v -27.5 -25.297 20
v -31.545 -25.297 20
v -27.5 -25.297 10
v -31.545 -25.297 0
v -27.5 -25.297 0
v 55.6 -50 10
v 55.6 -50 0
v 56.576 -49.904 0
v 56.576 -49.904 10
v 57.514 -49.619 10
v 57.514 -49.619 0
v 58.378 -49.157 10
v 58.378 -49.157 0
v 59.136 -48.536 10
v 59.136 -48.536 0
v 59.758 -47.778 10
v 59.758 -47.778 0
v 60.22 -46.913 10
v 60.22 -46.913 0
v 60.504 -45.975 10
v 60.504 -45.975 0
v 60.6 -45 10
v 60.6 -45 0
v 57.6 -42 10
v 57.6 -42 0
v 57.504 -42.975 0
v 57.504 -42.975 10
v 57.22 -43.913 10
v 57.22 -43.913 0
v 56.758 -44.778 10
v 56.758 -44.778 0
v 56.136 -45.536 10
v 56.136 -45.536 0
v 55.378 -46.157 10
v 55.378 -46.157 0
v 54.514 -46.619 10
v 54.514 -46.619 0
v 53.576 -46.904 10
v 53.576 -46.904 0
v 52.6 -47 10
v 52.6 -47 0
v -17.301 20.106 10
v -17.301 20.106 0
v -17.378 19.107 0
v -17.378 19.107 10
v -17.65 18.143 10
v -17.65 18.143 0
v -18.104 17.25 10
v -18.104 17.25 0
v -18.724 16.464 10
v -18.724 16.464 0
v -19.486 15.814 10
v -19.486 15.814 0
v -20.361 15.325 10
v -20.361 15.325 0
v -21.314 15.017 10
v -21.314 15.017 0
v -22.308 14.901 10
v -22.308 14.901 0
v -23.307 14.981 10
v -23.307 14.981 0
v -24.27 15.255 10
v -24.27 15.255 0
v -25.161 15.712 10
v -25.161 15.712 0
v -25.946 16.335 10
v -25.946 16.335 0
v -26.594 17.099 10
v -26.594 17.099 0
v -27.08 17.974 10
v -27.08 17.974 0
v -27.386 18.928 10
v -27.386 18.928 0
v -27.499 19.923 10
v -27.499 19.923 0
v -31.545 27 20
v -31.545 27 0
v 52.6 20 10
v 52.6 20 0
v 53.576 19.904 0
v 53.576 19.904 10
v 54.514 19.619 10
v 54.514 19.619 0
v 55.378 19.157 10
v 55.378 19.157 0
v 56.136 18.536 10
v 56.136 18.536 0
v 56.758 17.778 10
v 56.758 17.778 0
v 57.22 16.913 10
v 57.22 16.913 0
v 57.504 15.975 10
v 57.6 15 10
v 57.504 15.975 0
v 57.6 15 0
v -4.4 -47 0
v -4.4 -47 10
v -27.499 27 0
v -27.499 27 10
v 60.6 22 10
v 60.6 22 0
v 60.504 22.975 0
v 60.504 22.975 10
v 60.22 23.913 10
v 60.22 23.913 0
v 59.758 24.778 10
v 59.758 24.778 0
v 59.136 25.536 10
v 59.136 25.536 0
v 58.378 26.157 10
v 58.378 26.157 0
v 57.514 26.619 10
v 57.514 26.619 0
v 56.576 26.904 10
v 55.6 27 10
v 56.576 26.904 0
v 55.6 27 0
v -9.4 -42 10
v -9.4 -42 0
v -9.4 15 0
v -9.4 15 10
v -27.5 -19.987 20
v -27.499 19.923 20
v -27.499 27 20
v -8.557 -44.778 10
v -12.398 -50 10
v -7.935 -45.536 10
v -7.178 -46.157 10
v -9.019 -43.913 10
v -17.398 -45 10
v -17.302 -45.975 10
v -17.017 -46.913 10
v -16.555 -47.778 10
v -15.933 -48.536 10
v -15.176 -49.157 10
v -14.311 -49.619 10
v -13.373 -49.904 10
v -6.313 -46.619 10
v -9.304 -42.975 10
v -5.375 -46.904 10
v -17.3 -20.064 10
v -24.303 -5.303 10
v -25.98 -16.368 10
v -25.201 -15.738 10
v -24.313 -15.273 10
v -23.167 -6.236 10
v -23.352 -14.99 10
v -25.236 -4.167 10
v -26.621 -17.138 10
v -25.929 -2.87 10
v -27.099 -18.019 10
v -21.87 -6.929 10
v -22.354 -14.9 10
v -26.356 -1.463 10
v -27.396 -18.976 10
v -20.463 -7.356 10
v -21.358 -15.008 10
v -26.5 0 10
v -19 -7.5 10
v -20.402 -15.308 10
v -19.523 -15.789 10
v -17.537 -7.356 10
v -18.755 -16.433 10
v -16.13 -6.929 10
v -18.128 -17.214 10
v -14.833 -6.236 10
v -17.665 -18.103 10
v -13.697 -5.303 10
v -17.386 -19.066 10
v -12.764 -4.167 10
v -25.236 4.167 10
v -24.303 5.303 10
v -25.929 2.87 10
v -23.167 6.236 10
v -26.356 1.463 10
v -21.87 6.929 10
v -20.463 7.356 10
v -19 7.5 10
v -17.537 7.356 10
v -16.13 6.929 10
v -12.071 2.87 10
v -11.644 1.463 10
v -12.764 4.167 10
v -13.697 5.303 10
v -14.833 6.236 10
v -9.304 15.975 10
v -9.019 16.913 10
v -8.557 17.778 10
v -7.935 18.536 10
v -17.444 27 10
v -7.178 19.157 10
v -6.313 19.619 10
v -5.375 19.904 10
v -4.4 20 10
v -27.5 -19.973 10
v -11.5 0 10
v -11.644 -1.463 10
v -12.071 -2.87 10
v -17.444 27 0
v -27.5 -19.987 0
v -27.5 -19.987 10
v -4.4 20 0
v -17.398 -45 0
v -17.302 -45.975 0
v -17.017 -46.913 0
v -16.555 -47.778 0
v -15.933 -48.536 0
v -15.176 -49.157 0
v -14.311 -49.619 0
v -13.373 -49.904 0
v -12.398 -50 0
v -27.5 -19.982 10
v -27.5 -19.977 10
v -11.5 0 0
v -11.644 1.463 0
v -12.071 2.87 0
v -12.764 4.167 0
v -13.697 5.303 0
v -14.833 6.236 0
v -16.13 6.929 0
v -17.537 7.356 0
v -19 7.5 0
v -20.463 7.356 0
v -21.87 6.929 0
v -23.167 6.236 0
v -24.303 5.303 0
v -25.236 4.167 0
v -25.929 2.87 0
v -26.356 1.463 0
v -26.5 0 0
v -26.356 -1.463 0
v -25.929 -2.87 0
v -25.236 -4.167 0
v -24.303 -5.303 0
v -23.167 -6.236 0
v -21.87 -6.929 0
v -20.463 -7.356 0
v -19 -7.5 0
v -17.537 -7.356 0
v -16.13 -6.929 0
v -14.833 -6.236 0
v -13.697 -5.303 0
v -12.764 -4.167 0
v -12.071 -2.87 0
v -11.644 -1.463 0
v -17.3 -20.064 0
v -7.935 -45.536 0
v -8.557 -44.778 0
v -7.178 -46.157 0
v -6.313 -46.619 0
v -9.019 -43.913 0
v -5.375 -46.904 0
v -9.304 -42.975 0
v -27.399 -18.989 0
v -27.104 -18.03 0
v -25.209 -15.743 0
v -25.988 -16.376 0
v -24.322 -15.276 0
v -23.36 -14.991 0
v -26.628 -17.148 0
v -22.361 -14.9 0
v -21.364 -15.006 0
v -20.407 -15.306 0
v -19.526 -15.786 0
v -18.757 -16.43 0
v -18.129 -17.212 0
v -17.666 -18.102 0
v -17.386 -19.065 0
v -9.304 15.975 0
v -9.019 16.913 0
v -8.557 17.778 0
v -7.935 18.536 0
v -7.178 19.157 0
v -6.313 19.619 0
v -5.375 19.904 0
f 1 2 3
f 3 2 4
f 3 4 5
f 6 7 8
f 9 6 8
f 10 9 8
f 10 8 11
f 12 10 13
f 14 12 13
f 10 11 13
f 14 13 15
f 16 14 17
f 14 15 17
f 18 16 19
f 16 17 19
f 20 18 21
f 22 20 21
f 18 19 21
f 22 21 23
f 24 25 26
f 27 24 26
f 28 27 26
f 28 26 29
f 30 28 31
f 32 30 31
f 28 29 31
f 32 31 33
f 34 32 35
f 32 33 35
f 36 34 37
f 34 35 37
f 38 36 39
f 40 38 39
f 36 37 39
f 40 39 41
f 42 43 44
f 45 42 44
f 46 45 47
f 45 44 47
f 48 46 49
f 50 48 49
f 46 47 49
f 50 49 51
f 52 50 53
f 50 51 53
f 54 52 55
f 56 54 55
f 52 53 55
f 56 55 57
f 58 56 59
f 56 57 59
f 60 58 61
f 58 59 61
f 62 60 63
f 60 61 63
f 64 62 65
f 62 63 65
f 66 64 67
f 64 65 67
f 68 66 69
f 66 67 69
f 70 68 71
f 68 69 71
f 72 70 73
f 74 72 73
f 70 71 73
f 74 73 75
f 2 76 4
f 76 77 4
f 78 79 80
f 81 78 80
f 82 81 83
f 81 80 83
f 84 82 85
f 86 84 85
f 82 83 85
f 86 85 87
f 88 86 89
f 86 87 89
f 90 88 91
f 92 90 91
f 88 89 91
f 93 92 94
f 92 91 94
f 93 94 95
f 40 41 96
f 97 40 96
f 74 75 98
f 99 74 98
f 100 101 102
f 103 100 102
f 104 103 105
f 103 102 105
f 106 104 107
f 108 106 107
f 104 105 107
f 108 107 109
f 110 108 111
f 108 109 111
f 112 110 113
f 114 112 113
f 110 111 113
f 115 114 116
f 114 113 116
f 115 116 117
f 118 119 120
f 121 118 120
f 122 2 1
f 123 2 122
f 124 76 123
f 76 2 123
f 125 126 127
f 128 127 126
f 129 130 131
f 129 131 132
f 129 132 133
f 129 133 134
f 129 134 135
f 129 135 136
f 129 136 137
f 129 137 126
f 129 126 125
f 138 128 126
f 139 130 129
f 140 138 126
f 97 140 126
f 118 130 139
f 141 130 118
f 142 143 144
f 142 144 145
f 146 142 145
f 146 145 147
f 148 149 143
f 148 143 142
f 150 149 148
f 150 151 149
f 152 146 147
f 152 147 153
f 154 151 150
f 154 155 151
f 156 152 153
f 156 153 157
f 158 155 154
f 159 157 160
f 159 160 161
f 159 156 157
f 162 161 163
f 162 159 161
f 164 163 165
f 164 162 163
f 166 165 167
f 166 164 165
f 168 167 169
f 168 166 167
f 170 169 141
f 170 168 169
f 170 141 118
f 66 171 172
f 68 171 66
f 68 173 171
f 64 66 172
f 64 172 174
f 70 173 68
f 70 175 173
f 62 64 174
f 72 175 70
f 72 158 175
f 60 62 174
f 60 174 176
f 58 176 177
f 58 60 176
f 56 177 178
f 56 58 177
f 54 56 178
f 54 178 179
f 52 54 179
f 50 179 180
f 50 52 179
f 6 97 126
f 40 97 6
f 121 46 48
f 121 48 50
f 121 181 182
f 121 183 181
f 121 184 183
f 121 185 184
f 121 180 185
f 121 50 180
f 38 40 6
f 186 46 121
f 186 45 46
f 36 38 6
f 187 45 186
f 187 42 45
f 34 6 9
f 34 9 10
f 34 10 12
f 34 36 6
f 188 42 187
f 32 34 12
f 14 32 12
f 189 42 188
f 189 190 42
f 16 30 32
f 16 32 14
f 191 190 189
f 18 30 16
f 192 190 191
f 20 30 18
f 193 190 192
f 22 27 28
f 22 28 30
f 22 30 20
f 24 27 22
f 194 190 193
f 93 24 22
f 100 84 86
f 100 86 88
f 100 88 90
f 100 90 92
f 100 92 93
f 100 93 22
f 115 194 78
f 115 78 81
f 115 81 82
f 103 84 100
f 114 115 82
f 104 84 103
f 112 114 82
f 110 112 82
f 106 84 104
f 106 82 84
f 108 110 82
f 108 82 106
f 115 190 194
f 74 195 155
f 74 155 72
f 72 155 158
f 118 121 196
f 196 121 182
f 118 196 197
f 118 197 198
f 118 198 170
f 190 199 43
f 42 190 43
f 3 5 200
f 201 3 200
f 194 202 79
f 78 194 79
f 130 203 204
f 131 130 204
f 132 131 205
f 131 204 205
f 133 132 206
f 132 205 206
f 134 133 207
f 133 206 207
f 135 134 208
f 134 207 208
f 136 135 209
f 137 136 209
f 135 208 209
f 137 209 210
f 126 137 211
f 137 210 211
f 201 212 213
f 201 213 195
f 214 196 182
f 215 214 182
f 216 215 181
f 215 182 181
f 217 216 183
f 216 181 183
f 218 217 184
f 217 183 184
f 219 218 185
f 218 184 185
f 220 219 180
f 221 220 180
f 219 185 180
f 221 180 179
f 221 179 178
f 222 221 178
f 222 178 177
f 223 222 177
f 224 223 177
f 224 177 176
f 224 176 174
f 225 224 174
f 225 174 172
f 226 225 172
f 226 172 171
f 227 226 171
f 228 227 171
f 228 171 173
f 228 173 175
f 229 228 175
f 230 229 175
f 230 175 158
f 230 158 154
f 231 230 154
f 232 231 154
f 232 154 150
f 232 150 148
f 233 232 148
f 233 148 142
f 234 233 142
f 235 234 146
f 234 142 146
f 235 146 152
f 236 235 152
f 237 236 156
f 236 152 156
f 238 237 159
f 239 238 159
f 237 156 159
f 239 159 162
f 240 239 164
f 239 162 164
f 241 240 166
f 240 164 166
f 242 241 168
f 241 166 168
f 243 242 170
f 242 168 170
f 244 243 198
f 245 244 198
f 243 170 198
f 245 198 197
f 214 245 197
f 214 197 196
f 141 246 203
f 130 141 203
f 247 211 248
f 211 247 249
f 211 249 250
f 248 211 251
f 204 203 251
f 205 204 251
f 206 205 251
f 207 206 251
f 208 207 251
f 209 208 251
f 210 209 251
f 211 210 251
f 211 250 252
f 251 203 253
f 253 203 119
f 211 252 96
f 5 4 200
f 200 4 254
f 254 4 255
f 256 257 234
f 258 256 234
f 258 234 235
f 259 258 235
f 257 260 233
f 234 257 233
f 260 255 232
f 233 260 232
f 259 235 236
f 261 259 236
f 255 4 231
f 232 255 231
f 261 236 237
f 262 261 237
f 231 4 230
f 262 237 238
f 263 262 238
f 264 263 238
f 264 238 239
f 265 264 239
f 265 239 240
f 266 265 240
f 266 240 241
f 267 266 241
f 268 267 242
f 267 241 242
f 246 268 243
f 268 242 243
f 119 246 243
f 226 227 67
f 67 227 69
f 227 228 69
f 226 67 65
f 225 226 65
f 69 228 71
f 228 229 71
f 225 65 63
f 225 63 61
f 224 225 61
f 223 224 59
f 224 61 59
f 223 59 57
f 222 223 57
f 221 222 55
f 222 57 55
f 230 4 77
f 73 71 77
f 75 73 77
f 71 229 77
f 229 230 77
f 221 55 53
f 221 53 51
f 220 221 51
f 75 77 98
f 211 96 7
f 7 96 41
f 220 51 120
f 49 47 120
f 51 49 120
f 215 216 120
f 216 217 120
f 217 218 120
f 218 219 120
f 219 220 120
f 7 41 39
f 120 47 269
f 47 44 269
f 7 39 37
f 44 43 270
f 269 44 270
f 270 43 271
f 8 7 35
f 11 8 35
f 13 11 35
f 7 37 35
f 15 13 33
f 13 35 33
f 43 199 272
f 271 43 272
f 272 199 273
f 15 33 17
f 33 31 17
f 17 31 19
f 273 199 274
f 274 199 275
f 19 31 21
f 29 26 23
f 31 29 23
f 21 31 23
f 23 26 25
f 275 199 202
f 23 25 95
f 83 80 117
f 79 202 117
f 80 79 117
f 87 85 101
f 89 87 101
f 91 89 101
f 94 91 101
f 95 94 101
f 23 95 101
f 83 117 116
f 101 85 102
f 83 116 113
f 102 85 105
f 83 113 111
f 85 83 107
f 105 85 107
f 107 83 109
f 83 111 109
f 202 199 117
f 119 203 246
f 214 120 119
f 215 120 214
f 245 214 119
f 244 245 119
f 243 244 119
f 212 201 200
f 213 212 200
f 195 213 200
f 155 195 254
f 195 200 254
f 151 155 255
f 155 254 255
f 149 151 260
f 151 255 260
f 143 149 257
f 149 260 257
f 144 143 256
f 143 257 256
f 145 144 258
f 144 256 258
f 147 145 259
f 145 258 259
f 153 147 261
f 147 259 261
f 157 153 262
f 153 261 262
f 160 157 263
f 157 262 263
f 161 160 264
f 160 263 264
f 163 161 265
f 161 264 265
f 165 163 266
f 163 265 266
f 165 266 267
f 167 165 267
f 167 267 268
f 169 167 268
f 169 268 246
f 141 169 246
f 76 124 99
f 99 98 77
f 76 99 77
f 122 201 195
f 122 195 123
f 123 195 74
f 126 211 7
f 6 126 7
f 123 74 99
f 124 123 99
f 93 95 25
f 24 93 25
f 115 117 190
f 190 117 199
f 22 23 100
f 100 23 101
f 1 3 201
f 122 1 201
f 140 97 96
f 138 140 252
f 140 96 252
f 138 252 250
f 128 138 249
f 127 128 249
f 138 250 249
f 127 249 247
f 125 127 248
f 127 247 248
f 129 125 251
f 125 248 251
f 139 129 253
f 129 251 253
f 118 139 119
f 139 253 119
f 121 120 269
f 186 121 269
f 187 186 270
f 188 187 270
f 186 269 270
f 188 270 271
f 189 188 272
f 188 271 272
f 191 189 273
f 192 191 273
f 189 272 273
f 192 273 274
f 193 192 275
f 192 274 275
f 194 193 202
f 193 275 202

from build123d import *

# Parameters (mm, degrees)
F1_DEPTH = 10
F3_DEPTH = 10
F2_R     = 7.5
F4_DEPTH = 25


# Not quite as in the source:
# - a feature names something its author has since deleted; it is built from what else it names


with BuildPart() as f1:
    # F0 (on Top) → F1 (new body)
    with BuildSketch(Plane.XY):
        with BuildLine():
            Line((-12.3976909148, -50), (55.6003173012, -50))
            ThreePointArc((55.6003173012, -50), (59.1358512071, -48.5355339059), (60.6003173012, -45))
            Line((60.6003173012, -45), (60.6003173012, 22))
            ThreePointArc((60.6003173012, 22), (59.1358512071, 25.5355339059), (55.6003173012, 27))
            Line((55.6003173012, 27), (-17.4436509052, 27))
            Line((-17.4436509052, 27), (-17.3007774584, 20.1056662166))
            ThreePointArc((-17.3007774584, 20.1056662166), (-22.3084516237, 14.9008160564), (-27.4991044794, 19.9232047976))
            Line((-27.4991044794, 19.9232047976), (-27.4991044794, 27))
            Line((-27.4991044794, 27), (-31.5450169146, 27))
            Line((-31.5450169146, 27), (-31.5450169146, -25.2973511815))
            Line((-31.5450169146, -25.2973511815), (-27.499666141, -25.2973511815))
            Line((-27.499666141, -25.2973511815), (-27.499666141, -19.9870042568))
            ThreePointArc((-27.499666141, -19.9870042568), (-22.3611815213, -14.9001453296), (-17.3000843541, -20.0640056487))
            Line((-17.3000843541, -20.0640056487), (-17.3976909148, -45))
            ThreePointArc((-17.3976909148, -45), (-15.9332248208, -48.5355339059), (-12.3976909148, -50))
        make_face()
        with BuildLine():
            ThreePointArc((52.6003173012, 20), (56.1358512071, 18.5355339059), (57.6003173012, 15))
            Line((57.6003173012, 15), (57.6003173012, -42))
            ThreePointArc((57.6003173012, -42), (56.1358512071, -45.5355339059), (52.6003173012, -47))
            Line((52.6003173012, -47), (-4.3996826988, -47))
            ThreePointArc((-4.3996826988, -47), (-7.9352166047, -45.5355339059), (-9.3996826988, -42))
            Line((-9.3996826988, -42), (-9.3996826988, 15))
            ThreePointArc((-9.3996826988, 15), (-7.9352166047, 18.5355339059), (-4.3996826988, 20))
            Line((-4.3996826988, 20), (52.6003173012, 20))
        make_face(mode=Mode.SUBTRACT)
    extrude(amount=F1_DEPTH)

    # F2 (on face) → F3 (join)
    with BuildSketch(Plane.XY.offset(10)):
        Polygon((-27.4991044794, 27), (-31.5450169146, 27), (-31.5450169146, -25.2973511815), (-27.499666141, -25.2973511815), (-27.4996091091, -19.9870042574), (-27.4991804826, 19.9232047984), align=None)
    extrude(amount=F3_DEPTH)

    # F2 (on face) → F4 (cut)
    with BuildSketch(Plane.XY.offset(10)):
        with Locations((-19, 0)):
            Circle(F2_R)
    extrude(amount=-F4_DEPTH, mode=Mode.SUBTRACT)


solid = f1.part
